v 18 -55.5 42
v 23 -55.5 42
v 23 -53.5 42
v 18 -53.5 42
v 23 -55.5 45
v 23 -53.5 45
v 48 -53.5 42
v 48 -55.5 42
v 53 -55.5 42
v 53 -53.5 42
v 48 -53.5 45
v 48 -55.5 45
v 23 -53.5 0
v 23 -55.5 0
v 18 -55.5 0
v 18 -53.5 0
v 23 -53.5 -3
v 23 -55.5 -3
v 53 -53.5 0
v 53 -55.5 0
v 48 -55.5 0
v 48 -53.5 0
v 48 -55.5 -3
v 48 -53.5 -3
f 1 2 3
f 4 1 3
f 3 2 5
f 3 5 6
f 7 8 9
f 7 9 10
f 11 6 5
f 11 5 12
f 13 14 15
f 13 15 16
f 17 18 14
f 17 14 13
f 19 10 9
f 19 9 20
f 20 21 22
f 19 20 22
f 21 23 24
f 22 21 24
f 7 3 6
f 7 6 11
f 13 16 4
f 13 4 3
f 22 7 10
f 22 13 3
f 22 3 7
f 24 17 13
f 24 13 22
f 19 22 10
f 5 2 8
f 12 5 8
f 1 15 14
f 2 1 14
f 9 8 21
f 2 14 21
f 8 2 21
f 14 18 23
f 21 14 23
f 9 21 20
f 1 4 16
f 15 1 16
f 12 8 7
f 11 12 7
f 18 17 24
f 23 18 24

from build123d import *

# Parameters (mm, degrees)
ESTRUSIONE_ESTRUSIONE1_DEPTH      = 45
ESTRUSIONE_ESTRUSIONE1_DEPTH_BACK = 3
SCHIZZO1_W                        = 25
SCHIZZO1_H                        = 2
SCHIZZO2_W                        = 42
SCHIZZO2_H                        = 2
ESTRUSIONE_ESTRUSIONE2_DEPTH      = 5


with BuildPart() as part:
    # Schizzo1 → Estrusione-Estrusione1 (new, two sides: drawn at the far end of the back side and taken through both)
    with BuildSketch(Plane.XY.offset(-ESTRUSIONE_ESTRUSIONE1_DEPTH_BACK)):
        with Locations((35.5, -54.5)):
            Rectangle(SCHIZZO1_W, SCHIZZO1_H)
    extrude(amount=ESTRUSIONE_ESTRUSIONE1_DEPTH + ESTRUSIONE_ESTRUSIONE1_DEPTH_BACK)

    # Schizzo2 → Estrusione-Estrusione2 (add)
    with BuildSketch(Plane(origin=(48, 0, 0), x_dir=(0, 0, -1), z_dir=(1, 0, 0))):
        with Locations((-21, -54.5)):
            Rectangle(SCHIZZO2_W, SCHIZZO2_H)
    estrusione_estrusione2 = extrude(amount=ESTRUSIONE_ESTRUSIONE2_DEPTH)

    # Specchia1: Estrusione-Estrusione2 across plane
    add(estrusione_estrusione2.mirror(Plane(origin=(35.5, 0, 0), x_dir=(0, 0, 1), z_dir=(1, 0, 0))))


solid = part.part
